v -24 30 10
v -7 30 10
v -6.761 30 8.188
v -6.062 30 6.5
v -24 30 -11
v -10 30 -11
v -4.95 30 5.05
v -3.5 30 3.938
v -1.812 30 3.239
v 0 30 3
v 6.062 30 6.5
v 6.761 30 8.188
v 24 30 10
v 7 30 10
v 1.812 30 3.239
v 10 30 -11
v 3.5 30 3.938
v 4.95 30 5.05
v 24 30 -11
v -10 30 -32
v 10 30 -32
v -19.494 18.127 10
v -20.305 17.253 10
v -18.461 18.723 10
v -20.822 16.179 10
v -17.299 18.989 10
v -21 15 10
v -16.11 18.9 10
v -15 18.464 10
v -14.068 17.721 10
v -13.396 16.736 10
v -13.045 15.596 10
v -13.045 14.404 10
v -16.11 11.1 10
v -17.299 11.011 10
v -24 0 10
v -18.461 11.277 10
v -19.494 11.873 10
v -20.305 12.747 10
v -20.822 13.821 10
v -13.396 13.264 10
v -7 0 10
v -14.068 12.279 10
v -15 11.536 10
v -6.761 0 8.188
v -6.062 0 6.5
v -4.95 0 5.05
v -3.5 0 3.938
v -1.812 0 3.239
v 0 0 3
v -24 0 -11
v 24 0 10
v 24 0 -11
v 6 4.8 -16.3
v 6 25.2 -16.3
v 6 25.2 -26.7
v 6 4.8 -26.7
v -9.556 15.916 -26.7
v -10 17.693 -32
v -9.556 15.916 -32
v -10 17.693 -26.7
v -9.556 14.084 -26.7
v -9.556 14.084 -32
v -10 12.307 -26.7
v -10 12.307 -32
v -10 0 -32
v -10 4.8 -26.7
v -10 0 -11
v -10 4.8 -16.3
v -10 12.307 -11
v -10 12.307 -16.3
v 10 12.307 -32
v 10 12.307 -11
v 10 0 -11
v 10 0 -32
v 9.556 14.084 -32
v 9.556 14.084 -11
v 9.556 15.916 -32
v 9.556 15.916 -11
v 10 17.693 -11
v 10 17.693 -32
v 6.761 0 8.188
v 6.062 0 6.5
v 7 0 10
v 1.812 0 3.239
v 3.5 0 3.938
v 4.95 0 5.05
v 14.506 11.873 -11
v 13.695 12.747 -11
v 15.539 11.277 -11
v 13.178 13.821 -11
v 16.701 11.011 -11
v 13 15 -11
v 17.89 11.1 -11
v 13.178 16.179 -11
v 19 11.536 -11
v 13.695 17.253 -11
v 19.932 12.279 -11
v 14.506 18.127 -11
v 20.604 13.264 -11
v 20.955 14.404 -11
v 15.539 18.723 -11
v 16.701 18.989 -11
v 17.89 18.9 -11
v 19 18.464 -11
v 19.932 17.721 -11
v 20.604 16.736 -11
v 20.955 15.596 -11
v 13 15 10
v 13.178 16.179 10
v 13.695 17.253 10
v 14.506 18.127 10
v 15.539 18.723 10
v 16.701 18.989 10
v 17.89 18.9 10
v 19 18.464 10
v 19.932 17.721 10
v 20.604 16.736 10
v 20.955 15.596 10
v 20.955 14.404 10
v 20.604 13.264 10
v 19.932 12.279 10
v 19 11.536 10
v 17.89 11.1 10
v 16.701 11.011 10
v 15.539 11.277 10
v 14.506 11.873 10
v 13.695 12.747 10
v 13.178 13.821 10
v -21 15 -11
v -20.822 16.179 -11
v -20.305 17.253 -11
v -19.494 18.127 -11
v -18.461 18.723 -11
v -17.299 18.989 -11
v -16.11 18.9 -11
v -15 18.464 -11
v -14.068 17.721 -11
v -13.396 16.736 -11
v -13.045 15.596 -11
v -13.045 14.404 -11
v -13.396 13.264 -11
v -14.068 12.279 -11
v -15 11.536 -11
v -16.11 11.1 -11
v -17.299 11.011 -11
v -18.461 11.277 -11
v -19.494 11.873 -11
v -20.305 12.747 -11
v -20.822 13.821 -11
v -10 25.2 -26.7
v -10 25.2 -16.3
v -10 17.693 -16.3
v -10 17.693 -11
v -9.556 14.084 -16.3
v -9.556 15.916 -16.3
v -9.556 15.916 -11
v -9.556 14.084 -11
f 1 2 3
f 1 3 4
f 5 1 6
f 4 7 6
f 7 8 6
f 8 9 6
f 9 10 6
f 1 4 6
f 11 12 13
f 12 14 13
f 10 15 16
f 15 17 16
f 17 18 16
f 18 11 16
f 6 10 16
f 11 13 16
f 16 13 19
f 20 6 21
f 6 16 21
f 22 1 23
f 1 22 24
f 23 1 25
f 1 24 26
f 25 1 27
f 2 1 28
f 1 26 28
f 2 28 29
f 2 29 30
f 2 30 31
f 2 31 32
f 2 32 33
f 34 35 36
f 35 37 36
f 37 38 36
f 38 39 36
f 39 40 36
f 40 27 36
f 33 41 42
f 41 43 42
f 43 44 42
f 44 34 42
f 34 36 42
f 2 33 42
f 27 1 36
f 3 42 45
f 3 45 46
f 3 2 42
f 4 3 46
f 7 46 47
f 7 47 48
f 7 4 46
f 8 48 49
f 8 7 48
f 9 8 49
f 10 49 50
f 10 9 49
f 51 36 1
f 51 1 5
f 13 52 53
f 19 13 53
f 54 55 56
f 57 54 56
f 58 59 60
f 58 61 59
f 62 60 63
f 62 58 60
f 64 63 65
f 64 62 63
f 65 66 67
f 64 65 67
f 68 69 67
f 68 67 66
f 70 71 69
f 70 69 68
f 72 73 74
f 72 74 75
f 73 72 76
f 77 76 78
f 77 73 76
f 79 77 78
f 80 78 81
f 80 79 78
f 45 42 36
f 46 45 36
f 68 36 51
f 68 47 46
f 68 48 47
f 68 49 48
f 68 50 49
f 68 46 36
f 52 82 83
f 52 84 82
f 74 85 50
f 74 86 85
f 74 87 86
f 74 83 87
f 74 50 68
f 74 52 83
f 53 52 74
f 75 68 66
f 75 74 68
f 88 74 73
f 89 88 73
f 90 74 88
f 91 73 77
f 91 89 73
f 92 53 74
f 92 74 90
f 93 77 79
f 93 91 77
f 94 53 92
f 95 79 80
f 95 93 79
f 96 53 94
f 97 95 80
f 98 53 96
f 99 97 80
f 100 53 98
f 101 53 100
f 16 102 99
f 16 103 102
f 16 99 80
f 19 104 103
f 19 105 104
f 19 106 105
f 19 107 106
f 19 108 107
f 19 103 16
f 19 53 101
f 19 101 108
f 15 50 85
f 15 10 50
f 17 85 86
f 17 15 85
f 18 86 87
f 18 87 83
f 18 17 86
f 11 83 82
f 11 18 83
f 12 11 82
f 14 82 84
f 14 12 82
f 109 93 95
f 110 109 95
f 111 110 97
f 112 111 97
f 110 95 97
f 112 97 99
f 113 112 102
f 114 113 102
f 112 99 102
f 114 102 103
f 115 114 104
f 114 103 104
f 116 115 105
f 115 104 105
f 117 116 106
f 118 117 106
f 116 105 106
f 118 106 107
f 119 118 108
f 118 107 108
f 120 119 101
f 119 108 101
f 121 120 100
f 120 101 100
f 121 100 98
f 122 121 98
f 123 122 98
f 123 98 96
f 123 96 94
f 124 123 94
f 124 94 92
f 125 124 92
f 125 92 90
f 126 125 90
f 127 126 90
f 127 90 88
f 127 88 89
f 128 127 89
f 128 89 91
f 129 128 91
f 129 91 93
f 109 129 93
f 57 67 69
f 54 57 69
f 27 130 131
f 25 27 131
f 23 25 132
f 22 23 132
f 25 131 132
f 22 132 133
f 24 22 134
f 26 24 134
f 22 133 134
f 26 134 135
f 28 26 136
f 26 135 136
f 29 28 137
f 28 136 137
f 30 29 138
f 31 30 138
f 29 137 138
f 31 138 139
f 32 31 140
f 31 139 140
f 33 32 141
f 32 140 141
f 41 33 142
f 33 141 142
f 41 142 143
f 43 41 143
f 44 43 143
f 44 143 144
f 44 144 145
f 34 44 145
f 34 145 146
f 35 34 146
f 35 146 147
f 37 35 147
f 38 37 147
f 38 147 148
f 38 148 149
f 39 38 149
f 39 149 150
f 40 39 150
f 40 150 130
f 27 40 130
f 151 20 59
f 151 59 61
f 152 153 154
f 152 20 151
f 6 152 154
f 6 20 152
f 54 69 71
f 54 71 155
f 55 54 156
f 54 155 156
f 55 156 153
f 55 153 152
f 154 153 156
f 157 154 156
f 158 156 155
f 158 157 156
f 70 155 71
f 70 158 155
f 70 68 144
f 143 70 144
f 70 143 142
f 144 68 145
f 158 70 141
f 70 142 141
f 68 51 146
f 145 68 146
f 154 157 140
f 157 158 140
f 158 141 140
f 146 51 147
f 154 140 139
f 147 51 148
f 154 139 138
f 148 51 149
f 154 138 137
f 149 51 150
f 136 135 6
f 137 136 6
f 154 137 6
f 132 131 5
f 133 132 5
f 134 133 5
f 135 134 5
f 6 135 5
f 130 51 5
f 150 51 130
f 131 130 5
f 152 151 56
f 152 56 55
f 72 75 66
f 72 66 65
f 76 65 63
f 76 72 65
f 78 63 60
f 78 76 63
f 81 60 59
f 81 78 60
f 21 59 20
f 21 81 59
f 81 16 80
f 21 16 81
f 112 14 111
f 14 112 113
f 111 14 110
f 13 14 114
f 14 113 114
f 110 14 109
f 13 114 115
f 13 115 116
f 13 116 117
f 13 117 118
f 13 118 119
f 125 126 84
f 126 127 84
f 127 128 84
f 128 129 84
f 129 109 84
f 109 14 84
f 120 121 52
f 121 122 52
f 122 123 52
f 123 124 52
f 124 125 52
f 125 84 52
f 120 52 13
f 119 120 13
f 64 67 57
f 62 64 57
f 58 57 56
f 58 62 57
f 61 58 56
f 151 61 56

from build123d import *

# Parameters (mm, degrees)
SKETCH_1_W          = 48
SKETCH_1_H          = 20
EXTRUDE_1_DEPTH     = 30
SKETCH_2_W          = 14
SKETCH_2_H          = 30
CUT_EXTRUDE_1_DEPTH = 7
SKETCH_7_W          = 22
SKETCH_7_H          = 30
EXTRUDE_2_DEPTH     = 48
SKETCH_8_W          = 21
SKETCH_8_H          = 30
CUT_EXTRUDE_2_DEPTH = 14
SKETCH_9_W          = 21
SKETCH_9_H          = 30
CUT_EXTRUDE_3_DEPTH = 14
SKETCH_11_W         = 10.4
SKETCH_11_H         = 20.4
CUT_EXTRUDE_4_DEPTH = 56.497747702
SKETCH_13_R         = 4
CUT_EXTRUDE_5_DEPTH = 44.783558558
SKETCH_14_R         = 4
CUT_EXTRUDE_6_DEPTH = 44.783558558
FILLET_1_R          = 7
SKETCH1_W           = 10.4
SKETCH1_H           = 20.4
BOSS_EXTRUDE1_DEPTH = 4
SKETCH_20_R         = 7.5
CUT_EXTRUDE_8_DEPTH = 44.783558558


with BuildPart() as part:
    # Эскиз1 → Бобышка-Вытянуть1 (new body)
    with BuildSketch(Plane(origin=(0, 0, 0), x_dir=(1, 0, 0), z_dir=(0, 1, 0))):
        Rectangle(SKETCH_1_W, SKETCH_1_H)
    extrude(amount=EXTRUDE_1_DEPTH)

    # Эскиз2 → Вырез-Вытянуть1 (cut)
    with BuildSketch(Plane.XY.offset(10)):
        with Locations((0, 15)):
            Rectangle(SKETCH_2_W, SKETCH_2_H)
    extrude(amount=-CUT_EXTRUDE_1_DEPTH, mode=Mode.SUBTRACT)

    # Эскиз7 → Бобышка-Вытянуть2 (add)
    with BuildSketch(Plane(origin=(24, 0, 0), x_dir=(0, 0, -1), z_dir=(1, 0, 0))):
        with Locations((21, 15)):
            Rectangle(SKETCH_7_W, SKETCH_7_H)
    extrude(amount=-EXTRUDE_2_DEPTH)

    # Эскиз8 → Вырез-Вытянуть2 (cut)
    with BuildSketch(Plane(origin=(24, 0, 0), x_dir=(0, 0, -1), z_dir=(1, 0, 0))):
        with Locations((21.5, 15)):
            Rectangle(SKETCH_8_W, SKETCH_8_H)
    extrude(amount=-CUT_EXTRUDE_2_DEPTH, mode=Mode.SUBTRACT)

    # Эскиз9 → Вырез-Вытянуть3 (cut)
    with BuildSketch(Plane.ZY.offset(24)):
        with Locations((-21.5, 15)):
            Rectangle(SKETCH_9_W, SKETCH_9_H)
    extrude(amount=-CUT_EXTRUDE_3_DEPTH, mode=Mode.SUBTRACT)

    # Эскиз11 → Вырез-Вытянуть4 (cut, through all)
    with BuildSketch(Plane.ZY.offset(10)):
        with Locations((-21.5, 15)):
            Rectangle(SKETCH_11_W, SKETCH_11_H)
    extrude(amount=-CUT_EXTRUDE_4_DEPTH, mode=Mode.SUBTRACT)

    # Эскиз13 → Вырез-Вытянуть5 (cut, through all)
    with BuildSketch(Plane(origin=(0, 0, -11), x_dir=(-1, 0, 0), z_dir=(0, 0, -1))):
        with Locations((17, 15)):
            Circle(SKETCH_13_R)
    extrude(amount=-CUT_EXTRUDE_5_DEPTH, mode=Mode.SUBTRACT)

    # Эскиз14 → Вырез-Вытянуть6 (cut, through all)
    with BuildSketch(Plane(origin=(0, 0, -11), x_dir=(-1, 0, 0), z_dir=(0, 0, -1))):
        with Locations((-17, 15)):
            Circle(SKETCH_14_R)
    extrude(amount=-CUT_EXTRUDE_6_DEPTH, mode=Mode.SUBTRACT)

    # Скругление1
    fillet_1_edges = [part.edges().sort_by_distance(p)[0] for p in [
        (-7, 15, 3),
        (7, 15, 3),
    ]]
    fillet(fillet_1_edges, radius=FILLET_1_R - 0.0001)  # a hair under: the kernel refuses the full size

    # Sketch1 → Boss-Extrude1 (add)
    with BuildSketch(Plane(origin=(10, 0, 0), x_dir=(0, 0, -1), z_dir=(1, 0, 0))):
        with Locations((21.5, 15)):
            Rectangle(SKETCH1_W, SKETCH1_H)
    extrude(amount=-BOSS_EXTRUDE1_DEPTH)

    # Эскиз20 → Вырез-Вытянуть8 (cut, through all)
    with BuildSketch(Plane(origin=(0, 0, -11), x_dir=(-1, 0, 0), z_dir=(0, 0, -1))):
        with Locations((-17, 15)):
            Circle(SKETCH_20_R)
        with Locations((17, 15)):
            Circle(SKETCH_20_R)
    extrude(amount=CUT_EXTRUDE_8_DEPTH, mode=Mode.SUBTRACT)


solid = part.part
